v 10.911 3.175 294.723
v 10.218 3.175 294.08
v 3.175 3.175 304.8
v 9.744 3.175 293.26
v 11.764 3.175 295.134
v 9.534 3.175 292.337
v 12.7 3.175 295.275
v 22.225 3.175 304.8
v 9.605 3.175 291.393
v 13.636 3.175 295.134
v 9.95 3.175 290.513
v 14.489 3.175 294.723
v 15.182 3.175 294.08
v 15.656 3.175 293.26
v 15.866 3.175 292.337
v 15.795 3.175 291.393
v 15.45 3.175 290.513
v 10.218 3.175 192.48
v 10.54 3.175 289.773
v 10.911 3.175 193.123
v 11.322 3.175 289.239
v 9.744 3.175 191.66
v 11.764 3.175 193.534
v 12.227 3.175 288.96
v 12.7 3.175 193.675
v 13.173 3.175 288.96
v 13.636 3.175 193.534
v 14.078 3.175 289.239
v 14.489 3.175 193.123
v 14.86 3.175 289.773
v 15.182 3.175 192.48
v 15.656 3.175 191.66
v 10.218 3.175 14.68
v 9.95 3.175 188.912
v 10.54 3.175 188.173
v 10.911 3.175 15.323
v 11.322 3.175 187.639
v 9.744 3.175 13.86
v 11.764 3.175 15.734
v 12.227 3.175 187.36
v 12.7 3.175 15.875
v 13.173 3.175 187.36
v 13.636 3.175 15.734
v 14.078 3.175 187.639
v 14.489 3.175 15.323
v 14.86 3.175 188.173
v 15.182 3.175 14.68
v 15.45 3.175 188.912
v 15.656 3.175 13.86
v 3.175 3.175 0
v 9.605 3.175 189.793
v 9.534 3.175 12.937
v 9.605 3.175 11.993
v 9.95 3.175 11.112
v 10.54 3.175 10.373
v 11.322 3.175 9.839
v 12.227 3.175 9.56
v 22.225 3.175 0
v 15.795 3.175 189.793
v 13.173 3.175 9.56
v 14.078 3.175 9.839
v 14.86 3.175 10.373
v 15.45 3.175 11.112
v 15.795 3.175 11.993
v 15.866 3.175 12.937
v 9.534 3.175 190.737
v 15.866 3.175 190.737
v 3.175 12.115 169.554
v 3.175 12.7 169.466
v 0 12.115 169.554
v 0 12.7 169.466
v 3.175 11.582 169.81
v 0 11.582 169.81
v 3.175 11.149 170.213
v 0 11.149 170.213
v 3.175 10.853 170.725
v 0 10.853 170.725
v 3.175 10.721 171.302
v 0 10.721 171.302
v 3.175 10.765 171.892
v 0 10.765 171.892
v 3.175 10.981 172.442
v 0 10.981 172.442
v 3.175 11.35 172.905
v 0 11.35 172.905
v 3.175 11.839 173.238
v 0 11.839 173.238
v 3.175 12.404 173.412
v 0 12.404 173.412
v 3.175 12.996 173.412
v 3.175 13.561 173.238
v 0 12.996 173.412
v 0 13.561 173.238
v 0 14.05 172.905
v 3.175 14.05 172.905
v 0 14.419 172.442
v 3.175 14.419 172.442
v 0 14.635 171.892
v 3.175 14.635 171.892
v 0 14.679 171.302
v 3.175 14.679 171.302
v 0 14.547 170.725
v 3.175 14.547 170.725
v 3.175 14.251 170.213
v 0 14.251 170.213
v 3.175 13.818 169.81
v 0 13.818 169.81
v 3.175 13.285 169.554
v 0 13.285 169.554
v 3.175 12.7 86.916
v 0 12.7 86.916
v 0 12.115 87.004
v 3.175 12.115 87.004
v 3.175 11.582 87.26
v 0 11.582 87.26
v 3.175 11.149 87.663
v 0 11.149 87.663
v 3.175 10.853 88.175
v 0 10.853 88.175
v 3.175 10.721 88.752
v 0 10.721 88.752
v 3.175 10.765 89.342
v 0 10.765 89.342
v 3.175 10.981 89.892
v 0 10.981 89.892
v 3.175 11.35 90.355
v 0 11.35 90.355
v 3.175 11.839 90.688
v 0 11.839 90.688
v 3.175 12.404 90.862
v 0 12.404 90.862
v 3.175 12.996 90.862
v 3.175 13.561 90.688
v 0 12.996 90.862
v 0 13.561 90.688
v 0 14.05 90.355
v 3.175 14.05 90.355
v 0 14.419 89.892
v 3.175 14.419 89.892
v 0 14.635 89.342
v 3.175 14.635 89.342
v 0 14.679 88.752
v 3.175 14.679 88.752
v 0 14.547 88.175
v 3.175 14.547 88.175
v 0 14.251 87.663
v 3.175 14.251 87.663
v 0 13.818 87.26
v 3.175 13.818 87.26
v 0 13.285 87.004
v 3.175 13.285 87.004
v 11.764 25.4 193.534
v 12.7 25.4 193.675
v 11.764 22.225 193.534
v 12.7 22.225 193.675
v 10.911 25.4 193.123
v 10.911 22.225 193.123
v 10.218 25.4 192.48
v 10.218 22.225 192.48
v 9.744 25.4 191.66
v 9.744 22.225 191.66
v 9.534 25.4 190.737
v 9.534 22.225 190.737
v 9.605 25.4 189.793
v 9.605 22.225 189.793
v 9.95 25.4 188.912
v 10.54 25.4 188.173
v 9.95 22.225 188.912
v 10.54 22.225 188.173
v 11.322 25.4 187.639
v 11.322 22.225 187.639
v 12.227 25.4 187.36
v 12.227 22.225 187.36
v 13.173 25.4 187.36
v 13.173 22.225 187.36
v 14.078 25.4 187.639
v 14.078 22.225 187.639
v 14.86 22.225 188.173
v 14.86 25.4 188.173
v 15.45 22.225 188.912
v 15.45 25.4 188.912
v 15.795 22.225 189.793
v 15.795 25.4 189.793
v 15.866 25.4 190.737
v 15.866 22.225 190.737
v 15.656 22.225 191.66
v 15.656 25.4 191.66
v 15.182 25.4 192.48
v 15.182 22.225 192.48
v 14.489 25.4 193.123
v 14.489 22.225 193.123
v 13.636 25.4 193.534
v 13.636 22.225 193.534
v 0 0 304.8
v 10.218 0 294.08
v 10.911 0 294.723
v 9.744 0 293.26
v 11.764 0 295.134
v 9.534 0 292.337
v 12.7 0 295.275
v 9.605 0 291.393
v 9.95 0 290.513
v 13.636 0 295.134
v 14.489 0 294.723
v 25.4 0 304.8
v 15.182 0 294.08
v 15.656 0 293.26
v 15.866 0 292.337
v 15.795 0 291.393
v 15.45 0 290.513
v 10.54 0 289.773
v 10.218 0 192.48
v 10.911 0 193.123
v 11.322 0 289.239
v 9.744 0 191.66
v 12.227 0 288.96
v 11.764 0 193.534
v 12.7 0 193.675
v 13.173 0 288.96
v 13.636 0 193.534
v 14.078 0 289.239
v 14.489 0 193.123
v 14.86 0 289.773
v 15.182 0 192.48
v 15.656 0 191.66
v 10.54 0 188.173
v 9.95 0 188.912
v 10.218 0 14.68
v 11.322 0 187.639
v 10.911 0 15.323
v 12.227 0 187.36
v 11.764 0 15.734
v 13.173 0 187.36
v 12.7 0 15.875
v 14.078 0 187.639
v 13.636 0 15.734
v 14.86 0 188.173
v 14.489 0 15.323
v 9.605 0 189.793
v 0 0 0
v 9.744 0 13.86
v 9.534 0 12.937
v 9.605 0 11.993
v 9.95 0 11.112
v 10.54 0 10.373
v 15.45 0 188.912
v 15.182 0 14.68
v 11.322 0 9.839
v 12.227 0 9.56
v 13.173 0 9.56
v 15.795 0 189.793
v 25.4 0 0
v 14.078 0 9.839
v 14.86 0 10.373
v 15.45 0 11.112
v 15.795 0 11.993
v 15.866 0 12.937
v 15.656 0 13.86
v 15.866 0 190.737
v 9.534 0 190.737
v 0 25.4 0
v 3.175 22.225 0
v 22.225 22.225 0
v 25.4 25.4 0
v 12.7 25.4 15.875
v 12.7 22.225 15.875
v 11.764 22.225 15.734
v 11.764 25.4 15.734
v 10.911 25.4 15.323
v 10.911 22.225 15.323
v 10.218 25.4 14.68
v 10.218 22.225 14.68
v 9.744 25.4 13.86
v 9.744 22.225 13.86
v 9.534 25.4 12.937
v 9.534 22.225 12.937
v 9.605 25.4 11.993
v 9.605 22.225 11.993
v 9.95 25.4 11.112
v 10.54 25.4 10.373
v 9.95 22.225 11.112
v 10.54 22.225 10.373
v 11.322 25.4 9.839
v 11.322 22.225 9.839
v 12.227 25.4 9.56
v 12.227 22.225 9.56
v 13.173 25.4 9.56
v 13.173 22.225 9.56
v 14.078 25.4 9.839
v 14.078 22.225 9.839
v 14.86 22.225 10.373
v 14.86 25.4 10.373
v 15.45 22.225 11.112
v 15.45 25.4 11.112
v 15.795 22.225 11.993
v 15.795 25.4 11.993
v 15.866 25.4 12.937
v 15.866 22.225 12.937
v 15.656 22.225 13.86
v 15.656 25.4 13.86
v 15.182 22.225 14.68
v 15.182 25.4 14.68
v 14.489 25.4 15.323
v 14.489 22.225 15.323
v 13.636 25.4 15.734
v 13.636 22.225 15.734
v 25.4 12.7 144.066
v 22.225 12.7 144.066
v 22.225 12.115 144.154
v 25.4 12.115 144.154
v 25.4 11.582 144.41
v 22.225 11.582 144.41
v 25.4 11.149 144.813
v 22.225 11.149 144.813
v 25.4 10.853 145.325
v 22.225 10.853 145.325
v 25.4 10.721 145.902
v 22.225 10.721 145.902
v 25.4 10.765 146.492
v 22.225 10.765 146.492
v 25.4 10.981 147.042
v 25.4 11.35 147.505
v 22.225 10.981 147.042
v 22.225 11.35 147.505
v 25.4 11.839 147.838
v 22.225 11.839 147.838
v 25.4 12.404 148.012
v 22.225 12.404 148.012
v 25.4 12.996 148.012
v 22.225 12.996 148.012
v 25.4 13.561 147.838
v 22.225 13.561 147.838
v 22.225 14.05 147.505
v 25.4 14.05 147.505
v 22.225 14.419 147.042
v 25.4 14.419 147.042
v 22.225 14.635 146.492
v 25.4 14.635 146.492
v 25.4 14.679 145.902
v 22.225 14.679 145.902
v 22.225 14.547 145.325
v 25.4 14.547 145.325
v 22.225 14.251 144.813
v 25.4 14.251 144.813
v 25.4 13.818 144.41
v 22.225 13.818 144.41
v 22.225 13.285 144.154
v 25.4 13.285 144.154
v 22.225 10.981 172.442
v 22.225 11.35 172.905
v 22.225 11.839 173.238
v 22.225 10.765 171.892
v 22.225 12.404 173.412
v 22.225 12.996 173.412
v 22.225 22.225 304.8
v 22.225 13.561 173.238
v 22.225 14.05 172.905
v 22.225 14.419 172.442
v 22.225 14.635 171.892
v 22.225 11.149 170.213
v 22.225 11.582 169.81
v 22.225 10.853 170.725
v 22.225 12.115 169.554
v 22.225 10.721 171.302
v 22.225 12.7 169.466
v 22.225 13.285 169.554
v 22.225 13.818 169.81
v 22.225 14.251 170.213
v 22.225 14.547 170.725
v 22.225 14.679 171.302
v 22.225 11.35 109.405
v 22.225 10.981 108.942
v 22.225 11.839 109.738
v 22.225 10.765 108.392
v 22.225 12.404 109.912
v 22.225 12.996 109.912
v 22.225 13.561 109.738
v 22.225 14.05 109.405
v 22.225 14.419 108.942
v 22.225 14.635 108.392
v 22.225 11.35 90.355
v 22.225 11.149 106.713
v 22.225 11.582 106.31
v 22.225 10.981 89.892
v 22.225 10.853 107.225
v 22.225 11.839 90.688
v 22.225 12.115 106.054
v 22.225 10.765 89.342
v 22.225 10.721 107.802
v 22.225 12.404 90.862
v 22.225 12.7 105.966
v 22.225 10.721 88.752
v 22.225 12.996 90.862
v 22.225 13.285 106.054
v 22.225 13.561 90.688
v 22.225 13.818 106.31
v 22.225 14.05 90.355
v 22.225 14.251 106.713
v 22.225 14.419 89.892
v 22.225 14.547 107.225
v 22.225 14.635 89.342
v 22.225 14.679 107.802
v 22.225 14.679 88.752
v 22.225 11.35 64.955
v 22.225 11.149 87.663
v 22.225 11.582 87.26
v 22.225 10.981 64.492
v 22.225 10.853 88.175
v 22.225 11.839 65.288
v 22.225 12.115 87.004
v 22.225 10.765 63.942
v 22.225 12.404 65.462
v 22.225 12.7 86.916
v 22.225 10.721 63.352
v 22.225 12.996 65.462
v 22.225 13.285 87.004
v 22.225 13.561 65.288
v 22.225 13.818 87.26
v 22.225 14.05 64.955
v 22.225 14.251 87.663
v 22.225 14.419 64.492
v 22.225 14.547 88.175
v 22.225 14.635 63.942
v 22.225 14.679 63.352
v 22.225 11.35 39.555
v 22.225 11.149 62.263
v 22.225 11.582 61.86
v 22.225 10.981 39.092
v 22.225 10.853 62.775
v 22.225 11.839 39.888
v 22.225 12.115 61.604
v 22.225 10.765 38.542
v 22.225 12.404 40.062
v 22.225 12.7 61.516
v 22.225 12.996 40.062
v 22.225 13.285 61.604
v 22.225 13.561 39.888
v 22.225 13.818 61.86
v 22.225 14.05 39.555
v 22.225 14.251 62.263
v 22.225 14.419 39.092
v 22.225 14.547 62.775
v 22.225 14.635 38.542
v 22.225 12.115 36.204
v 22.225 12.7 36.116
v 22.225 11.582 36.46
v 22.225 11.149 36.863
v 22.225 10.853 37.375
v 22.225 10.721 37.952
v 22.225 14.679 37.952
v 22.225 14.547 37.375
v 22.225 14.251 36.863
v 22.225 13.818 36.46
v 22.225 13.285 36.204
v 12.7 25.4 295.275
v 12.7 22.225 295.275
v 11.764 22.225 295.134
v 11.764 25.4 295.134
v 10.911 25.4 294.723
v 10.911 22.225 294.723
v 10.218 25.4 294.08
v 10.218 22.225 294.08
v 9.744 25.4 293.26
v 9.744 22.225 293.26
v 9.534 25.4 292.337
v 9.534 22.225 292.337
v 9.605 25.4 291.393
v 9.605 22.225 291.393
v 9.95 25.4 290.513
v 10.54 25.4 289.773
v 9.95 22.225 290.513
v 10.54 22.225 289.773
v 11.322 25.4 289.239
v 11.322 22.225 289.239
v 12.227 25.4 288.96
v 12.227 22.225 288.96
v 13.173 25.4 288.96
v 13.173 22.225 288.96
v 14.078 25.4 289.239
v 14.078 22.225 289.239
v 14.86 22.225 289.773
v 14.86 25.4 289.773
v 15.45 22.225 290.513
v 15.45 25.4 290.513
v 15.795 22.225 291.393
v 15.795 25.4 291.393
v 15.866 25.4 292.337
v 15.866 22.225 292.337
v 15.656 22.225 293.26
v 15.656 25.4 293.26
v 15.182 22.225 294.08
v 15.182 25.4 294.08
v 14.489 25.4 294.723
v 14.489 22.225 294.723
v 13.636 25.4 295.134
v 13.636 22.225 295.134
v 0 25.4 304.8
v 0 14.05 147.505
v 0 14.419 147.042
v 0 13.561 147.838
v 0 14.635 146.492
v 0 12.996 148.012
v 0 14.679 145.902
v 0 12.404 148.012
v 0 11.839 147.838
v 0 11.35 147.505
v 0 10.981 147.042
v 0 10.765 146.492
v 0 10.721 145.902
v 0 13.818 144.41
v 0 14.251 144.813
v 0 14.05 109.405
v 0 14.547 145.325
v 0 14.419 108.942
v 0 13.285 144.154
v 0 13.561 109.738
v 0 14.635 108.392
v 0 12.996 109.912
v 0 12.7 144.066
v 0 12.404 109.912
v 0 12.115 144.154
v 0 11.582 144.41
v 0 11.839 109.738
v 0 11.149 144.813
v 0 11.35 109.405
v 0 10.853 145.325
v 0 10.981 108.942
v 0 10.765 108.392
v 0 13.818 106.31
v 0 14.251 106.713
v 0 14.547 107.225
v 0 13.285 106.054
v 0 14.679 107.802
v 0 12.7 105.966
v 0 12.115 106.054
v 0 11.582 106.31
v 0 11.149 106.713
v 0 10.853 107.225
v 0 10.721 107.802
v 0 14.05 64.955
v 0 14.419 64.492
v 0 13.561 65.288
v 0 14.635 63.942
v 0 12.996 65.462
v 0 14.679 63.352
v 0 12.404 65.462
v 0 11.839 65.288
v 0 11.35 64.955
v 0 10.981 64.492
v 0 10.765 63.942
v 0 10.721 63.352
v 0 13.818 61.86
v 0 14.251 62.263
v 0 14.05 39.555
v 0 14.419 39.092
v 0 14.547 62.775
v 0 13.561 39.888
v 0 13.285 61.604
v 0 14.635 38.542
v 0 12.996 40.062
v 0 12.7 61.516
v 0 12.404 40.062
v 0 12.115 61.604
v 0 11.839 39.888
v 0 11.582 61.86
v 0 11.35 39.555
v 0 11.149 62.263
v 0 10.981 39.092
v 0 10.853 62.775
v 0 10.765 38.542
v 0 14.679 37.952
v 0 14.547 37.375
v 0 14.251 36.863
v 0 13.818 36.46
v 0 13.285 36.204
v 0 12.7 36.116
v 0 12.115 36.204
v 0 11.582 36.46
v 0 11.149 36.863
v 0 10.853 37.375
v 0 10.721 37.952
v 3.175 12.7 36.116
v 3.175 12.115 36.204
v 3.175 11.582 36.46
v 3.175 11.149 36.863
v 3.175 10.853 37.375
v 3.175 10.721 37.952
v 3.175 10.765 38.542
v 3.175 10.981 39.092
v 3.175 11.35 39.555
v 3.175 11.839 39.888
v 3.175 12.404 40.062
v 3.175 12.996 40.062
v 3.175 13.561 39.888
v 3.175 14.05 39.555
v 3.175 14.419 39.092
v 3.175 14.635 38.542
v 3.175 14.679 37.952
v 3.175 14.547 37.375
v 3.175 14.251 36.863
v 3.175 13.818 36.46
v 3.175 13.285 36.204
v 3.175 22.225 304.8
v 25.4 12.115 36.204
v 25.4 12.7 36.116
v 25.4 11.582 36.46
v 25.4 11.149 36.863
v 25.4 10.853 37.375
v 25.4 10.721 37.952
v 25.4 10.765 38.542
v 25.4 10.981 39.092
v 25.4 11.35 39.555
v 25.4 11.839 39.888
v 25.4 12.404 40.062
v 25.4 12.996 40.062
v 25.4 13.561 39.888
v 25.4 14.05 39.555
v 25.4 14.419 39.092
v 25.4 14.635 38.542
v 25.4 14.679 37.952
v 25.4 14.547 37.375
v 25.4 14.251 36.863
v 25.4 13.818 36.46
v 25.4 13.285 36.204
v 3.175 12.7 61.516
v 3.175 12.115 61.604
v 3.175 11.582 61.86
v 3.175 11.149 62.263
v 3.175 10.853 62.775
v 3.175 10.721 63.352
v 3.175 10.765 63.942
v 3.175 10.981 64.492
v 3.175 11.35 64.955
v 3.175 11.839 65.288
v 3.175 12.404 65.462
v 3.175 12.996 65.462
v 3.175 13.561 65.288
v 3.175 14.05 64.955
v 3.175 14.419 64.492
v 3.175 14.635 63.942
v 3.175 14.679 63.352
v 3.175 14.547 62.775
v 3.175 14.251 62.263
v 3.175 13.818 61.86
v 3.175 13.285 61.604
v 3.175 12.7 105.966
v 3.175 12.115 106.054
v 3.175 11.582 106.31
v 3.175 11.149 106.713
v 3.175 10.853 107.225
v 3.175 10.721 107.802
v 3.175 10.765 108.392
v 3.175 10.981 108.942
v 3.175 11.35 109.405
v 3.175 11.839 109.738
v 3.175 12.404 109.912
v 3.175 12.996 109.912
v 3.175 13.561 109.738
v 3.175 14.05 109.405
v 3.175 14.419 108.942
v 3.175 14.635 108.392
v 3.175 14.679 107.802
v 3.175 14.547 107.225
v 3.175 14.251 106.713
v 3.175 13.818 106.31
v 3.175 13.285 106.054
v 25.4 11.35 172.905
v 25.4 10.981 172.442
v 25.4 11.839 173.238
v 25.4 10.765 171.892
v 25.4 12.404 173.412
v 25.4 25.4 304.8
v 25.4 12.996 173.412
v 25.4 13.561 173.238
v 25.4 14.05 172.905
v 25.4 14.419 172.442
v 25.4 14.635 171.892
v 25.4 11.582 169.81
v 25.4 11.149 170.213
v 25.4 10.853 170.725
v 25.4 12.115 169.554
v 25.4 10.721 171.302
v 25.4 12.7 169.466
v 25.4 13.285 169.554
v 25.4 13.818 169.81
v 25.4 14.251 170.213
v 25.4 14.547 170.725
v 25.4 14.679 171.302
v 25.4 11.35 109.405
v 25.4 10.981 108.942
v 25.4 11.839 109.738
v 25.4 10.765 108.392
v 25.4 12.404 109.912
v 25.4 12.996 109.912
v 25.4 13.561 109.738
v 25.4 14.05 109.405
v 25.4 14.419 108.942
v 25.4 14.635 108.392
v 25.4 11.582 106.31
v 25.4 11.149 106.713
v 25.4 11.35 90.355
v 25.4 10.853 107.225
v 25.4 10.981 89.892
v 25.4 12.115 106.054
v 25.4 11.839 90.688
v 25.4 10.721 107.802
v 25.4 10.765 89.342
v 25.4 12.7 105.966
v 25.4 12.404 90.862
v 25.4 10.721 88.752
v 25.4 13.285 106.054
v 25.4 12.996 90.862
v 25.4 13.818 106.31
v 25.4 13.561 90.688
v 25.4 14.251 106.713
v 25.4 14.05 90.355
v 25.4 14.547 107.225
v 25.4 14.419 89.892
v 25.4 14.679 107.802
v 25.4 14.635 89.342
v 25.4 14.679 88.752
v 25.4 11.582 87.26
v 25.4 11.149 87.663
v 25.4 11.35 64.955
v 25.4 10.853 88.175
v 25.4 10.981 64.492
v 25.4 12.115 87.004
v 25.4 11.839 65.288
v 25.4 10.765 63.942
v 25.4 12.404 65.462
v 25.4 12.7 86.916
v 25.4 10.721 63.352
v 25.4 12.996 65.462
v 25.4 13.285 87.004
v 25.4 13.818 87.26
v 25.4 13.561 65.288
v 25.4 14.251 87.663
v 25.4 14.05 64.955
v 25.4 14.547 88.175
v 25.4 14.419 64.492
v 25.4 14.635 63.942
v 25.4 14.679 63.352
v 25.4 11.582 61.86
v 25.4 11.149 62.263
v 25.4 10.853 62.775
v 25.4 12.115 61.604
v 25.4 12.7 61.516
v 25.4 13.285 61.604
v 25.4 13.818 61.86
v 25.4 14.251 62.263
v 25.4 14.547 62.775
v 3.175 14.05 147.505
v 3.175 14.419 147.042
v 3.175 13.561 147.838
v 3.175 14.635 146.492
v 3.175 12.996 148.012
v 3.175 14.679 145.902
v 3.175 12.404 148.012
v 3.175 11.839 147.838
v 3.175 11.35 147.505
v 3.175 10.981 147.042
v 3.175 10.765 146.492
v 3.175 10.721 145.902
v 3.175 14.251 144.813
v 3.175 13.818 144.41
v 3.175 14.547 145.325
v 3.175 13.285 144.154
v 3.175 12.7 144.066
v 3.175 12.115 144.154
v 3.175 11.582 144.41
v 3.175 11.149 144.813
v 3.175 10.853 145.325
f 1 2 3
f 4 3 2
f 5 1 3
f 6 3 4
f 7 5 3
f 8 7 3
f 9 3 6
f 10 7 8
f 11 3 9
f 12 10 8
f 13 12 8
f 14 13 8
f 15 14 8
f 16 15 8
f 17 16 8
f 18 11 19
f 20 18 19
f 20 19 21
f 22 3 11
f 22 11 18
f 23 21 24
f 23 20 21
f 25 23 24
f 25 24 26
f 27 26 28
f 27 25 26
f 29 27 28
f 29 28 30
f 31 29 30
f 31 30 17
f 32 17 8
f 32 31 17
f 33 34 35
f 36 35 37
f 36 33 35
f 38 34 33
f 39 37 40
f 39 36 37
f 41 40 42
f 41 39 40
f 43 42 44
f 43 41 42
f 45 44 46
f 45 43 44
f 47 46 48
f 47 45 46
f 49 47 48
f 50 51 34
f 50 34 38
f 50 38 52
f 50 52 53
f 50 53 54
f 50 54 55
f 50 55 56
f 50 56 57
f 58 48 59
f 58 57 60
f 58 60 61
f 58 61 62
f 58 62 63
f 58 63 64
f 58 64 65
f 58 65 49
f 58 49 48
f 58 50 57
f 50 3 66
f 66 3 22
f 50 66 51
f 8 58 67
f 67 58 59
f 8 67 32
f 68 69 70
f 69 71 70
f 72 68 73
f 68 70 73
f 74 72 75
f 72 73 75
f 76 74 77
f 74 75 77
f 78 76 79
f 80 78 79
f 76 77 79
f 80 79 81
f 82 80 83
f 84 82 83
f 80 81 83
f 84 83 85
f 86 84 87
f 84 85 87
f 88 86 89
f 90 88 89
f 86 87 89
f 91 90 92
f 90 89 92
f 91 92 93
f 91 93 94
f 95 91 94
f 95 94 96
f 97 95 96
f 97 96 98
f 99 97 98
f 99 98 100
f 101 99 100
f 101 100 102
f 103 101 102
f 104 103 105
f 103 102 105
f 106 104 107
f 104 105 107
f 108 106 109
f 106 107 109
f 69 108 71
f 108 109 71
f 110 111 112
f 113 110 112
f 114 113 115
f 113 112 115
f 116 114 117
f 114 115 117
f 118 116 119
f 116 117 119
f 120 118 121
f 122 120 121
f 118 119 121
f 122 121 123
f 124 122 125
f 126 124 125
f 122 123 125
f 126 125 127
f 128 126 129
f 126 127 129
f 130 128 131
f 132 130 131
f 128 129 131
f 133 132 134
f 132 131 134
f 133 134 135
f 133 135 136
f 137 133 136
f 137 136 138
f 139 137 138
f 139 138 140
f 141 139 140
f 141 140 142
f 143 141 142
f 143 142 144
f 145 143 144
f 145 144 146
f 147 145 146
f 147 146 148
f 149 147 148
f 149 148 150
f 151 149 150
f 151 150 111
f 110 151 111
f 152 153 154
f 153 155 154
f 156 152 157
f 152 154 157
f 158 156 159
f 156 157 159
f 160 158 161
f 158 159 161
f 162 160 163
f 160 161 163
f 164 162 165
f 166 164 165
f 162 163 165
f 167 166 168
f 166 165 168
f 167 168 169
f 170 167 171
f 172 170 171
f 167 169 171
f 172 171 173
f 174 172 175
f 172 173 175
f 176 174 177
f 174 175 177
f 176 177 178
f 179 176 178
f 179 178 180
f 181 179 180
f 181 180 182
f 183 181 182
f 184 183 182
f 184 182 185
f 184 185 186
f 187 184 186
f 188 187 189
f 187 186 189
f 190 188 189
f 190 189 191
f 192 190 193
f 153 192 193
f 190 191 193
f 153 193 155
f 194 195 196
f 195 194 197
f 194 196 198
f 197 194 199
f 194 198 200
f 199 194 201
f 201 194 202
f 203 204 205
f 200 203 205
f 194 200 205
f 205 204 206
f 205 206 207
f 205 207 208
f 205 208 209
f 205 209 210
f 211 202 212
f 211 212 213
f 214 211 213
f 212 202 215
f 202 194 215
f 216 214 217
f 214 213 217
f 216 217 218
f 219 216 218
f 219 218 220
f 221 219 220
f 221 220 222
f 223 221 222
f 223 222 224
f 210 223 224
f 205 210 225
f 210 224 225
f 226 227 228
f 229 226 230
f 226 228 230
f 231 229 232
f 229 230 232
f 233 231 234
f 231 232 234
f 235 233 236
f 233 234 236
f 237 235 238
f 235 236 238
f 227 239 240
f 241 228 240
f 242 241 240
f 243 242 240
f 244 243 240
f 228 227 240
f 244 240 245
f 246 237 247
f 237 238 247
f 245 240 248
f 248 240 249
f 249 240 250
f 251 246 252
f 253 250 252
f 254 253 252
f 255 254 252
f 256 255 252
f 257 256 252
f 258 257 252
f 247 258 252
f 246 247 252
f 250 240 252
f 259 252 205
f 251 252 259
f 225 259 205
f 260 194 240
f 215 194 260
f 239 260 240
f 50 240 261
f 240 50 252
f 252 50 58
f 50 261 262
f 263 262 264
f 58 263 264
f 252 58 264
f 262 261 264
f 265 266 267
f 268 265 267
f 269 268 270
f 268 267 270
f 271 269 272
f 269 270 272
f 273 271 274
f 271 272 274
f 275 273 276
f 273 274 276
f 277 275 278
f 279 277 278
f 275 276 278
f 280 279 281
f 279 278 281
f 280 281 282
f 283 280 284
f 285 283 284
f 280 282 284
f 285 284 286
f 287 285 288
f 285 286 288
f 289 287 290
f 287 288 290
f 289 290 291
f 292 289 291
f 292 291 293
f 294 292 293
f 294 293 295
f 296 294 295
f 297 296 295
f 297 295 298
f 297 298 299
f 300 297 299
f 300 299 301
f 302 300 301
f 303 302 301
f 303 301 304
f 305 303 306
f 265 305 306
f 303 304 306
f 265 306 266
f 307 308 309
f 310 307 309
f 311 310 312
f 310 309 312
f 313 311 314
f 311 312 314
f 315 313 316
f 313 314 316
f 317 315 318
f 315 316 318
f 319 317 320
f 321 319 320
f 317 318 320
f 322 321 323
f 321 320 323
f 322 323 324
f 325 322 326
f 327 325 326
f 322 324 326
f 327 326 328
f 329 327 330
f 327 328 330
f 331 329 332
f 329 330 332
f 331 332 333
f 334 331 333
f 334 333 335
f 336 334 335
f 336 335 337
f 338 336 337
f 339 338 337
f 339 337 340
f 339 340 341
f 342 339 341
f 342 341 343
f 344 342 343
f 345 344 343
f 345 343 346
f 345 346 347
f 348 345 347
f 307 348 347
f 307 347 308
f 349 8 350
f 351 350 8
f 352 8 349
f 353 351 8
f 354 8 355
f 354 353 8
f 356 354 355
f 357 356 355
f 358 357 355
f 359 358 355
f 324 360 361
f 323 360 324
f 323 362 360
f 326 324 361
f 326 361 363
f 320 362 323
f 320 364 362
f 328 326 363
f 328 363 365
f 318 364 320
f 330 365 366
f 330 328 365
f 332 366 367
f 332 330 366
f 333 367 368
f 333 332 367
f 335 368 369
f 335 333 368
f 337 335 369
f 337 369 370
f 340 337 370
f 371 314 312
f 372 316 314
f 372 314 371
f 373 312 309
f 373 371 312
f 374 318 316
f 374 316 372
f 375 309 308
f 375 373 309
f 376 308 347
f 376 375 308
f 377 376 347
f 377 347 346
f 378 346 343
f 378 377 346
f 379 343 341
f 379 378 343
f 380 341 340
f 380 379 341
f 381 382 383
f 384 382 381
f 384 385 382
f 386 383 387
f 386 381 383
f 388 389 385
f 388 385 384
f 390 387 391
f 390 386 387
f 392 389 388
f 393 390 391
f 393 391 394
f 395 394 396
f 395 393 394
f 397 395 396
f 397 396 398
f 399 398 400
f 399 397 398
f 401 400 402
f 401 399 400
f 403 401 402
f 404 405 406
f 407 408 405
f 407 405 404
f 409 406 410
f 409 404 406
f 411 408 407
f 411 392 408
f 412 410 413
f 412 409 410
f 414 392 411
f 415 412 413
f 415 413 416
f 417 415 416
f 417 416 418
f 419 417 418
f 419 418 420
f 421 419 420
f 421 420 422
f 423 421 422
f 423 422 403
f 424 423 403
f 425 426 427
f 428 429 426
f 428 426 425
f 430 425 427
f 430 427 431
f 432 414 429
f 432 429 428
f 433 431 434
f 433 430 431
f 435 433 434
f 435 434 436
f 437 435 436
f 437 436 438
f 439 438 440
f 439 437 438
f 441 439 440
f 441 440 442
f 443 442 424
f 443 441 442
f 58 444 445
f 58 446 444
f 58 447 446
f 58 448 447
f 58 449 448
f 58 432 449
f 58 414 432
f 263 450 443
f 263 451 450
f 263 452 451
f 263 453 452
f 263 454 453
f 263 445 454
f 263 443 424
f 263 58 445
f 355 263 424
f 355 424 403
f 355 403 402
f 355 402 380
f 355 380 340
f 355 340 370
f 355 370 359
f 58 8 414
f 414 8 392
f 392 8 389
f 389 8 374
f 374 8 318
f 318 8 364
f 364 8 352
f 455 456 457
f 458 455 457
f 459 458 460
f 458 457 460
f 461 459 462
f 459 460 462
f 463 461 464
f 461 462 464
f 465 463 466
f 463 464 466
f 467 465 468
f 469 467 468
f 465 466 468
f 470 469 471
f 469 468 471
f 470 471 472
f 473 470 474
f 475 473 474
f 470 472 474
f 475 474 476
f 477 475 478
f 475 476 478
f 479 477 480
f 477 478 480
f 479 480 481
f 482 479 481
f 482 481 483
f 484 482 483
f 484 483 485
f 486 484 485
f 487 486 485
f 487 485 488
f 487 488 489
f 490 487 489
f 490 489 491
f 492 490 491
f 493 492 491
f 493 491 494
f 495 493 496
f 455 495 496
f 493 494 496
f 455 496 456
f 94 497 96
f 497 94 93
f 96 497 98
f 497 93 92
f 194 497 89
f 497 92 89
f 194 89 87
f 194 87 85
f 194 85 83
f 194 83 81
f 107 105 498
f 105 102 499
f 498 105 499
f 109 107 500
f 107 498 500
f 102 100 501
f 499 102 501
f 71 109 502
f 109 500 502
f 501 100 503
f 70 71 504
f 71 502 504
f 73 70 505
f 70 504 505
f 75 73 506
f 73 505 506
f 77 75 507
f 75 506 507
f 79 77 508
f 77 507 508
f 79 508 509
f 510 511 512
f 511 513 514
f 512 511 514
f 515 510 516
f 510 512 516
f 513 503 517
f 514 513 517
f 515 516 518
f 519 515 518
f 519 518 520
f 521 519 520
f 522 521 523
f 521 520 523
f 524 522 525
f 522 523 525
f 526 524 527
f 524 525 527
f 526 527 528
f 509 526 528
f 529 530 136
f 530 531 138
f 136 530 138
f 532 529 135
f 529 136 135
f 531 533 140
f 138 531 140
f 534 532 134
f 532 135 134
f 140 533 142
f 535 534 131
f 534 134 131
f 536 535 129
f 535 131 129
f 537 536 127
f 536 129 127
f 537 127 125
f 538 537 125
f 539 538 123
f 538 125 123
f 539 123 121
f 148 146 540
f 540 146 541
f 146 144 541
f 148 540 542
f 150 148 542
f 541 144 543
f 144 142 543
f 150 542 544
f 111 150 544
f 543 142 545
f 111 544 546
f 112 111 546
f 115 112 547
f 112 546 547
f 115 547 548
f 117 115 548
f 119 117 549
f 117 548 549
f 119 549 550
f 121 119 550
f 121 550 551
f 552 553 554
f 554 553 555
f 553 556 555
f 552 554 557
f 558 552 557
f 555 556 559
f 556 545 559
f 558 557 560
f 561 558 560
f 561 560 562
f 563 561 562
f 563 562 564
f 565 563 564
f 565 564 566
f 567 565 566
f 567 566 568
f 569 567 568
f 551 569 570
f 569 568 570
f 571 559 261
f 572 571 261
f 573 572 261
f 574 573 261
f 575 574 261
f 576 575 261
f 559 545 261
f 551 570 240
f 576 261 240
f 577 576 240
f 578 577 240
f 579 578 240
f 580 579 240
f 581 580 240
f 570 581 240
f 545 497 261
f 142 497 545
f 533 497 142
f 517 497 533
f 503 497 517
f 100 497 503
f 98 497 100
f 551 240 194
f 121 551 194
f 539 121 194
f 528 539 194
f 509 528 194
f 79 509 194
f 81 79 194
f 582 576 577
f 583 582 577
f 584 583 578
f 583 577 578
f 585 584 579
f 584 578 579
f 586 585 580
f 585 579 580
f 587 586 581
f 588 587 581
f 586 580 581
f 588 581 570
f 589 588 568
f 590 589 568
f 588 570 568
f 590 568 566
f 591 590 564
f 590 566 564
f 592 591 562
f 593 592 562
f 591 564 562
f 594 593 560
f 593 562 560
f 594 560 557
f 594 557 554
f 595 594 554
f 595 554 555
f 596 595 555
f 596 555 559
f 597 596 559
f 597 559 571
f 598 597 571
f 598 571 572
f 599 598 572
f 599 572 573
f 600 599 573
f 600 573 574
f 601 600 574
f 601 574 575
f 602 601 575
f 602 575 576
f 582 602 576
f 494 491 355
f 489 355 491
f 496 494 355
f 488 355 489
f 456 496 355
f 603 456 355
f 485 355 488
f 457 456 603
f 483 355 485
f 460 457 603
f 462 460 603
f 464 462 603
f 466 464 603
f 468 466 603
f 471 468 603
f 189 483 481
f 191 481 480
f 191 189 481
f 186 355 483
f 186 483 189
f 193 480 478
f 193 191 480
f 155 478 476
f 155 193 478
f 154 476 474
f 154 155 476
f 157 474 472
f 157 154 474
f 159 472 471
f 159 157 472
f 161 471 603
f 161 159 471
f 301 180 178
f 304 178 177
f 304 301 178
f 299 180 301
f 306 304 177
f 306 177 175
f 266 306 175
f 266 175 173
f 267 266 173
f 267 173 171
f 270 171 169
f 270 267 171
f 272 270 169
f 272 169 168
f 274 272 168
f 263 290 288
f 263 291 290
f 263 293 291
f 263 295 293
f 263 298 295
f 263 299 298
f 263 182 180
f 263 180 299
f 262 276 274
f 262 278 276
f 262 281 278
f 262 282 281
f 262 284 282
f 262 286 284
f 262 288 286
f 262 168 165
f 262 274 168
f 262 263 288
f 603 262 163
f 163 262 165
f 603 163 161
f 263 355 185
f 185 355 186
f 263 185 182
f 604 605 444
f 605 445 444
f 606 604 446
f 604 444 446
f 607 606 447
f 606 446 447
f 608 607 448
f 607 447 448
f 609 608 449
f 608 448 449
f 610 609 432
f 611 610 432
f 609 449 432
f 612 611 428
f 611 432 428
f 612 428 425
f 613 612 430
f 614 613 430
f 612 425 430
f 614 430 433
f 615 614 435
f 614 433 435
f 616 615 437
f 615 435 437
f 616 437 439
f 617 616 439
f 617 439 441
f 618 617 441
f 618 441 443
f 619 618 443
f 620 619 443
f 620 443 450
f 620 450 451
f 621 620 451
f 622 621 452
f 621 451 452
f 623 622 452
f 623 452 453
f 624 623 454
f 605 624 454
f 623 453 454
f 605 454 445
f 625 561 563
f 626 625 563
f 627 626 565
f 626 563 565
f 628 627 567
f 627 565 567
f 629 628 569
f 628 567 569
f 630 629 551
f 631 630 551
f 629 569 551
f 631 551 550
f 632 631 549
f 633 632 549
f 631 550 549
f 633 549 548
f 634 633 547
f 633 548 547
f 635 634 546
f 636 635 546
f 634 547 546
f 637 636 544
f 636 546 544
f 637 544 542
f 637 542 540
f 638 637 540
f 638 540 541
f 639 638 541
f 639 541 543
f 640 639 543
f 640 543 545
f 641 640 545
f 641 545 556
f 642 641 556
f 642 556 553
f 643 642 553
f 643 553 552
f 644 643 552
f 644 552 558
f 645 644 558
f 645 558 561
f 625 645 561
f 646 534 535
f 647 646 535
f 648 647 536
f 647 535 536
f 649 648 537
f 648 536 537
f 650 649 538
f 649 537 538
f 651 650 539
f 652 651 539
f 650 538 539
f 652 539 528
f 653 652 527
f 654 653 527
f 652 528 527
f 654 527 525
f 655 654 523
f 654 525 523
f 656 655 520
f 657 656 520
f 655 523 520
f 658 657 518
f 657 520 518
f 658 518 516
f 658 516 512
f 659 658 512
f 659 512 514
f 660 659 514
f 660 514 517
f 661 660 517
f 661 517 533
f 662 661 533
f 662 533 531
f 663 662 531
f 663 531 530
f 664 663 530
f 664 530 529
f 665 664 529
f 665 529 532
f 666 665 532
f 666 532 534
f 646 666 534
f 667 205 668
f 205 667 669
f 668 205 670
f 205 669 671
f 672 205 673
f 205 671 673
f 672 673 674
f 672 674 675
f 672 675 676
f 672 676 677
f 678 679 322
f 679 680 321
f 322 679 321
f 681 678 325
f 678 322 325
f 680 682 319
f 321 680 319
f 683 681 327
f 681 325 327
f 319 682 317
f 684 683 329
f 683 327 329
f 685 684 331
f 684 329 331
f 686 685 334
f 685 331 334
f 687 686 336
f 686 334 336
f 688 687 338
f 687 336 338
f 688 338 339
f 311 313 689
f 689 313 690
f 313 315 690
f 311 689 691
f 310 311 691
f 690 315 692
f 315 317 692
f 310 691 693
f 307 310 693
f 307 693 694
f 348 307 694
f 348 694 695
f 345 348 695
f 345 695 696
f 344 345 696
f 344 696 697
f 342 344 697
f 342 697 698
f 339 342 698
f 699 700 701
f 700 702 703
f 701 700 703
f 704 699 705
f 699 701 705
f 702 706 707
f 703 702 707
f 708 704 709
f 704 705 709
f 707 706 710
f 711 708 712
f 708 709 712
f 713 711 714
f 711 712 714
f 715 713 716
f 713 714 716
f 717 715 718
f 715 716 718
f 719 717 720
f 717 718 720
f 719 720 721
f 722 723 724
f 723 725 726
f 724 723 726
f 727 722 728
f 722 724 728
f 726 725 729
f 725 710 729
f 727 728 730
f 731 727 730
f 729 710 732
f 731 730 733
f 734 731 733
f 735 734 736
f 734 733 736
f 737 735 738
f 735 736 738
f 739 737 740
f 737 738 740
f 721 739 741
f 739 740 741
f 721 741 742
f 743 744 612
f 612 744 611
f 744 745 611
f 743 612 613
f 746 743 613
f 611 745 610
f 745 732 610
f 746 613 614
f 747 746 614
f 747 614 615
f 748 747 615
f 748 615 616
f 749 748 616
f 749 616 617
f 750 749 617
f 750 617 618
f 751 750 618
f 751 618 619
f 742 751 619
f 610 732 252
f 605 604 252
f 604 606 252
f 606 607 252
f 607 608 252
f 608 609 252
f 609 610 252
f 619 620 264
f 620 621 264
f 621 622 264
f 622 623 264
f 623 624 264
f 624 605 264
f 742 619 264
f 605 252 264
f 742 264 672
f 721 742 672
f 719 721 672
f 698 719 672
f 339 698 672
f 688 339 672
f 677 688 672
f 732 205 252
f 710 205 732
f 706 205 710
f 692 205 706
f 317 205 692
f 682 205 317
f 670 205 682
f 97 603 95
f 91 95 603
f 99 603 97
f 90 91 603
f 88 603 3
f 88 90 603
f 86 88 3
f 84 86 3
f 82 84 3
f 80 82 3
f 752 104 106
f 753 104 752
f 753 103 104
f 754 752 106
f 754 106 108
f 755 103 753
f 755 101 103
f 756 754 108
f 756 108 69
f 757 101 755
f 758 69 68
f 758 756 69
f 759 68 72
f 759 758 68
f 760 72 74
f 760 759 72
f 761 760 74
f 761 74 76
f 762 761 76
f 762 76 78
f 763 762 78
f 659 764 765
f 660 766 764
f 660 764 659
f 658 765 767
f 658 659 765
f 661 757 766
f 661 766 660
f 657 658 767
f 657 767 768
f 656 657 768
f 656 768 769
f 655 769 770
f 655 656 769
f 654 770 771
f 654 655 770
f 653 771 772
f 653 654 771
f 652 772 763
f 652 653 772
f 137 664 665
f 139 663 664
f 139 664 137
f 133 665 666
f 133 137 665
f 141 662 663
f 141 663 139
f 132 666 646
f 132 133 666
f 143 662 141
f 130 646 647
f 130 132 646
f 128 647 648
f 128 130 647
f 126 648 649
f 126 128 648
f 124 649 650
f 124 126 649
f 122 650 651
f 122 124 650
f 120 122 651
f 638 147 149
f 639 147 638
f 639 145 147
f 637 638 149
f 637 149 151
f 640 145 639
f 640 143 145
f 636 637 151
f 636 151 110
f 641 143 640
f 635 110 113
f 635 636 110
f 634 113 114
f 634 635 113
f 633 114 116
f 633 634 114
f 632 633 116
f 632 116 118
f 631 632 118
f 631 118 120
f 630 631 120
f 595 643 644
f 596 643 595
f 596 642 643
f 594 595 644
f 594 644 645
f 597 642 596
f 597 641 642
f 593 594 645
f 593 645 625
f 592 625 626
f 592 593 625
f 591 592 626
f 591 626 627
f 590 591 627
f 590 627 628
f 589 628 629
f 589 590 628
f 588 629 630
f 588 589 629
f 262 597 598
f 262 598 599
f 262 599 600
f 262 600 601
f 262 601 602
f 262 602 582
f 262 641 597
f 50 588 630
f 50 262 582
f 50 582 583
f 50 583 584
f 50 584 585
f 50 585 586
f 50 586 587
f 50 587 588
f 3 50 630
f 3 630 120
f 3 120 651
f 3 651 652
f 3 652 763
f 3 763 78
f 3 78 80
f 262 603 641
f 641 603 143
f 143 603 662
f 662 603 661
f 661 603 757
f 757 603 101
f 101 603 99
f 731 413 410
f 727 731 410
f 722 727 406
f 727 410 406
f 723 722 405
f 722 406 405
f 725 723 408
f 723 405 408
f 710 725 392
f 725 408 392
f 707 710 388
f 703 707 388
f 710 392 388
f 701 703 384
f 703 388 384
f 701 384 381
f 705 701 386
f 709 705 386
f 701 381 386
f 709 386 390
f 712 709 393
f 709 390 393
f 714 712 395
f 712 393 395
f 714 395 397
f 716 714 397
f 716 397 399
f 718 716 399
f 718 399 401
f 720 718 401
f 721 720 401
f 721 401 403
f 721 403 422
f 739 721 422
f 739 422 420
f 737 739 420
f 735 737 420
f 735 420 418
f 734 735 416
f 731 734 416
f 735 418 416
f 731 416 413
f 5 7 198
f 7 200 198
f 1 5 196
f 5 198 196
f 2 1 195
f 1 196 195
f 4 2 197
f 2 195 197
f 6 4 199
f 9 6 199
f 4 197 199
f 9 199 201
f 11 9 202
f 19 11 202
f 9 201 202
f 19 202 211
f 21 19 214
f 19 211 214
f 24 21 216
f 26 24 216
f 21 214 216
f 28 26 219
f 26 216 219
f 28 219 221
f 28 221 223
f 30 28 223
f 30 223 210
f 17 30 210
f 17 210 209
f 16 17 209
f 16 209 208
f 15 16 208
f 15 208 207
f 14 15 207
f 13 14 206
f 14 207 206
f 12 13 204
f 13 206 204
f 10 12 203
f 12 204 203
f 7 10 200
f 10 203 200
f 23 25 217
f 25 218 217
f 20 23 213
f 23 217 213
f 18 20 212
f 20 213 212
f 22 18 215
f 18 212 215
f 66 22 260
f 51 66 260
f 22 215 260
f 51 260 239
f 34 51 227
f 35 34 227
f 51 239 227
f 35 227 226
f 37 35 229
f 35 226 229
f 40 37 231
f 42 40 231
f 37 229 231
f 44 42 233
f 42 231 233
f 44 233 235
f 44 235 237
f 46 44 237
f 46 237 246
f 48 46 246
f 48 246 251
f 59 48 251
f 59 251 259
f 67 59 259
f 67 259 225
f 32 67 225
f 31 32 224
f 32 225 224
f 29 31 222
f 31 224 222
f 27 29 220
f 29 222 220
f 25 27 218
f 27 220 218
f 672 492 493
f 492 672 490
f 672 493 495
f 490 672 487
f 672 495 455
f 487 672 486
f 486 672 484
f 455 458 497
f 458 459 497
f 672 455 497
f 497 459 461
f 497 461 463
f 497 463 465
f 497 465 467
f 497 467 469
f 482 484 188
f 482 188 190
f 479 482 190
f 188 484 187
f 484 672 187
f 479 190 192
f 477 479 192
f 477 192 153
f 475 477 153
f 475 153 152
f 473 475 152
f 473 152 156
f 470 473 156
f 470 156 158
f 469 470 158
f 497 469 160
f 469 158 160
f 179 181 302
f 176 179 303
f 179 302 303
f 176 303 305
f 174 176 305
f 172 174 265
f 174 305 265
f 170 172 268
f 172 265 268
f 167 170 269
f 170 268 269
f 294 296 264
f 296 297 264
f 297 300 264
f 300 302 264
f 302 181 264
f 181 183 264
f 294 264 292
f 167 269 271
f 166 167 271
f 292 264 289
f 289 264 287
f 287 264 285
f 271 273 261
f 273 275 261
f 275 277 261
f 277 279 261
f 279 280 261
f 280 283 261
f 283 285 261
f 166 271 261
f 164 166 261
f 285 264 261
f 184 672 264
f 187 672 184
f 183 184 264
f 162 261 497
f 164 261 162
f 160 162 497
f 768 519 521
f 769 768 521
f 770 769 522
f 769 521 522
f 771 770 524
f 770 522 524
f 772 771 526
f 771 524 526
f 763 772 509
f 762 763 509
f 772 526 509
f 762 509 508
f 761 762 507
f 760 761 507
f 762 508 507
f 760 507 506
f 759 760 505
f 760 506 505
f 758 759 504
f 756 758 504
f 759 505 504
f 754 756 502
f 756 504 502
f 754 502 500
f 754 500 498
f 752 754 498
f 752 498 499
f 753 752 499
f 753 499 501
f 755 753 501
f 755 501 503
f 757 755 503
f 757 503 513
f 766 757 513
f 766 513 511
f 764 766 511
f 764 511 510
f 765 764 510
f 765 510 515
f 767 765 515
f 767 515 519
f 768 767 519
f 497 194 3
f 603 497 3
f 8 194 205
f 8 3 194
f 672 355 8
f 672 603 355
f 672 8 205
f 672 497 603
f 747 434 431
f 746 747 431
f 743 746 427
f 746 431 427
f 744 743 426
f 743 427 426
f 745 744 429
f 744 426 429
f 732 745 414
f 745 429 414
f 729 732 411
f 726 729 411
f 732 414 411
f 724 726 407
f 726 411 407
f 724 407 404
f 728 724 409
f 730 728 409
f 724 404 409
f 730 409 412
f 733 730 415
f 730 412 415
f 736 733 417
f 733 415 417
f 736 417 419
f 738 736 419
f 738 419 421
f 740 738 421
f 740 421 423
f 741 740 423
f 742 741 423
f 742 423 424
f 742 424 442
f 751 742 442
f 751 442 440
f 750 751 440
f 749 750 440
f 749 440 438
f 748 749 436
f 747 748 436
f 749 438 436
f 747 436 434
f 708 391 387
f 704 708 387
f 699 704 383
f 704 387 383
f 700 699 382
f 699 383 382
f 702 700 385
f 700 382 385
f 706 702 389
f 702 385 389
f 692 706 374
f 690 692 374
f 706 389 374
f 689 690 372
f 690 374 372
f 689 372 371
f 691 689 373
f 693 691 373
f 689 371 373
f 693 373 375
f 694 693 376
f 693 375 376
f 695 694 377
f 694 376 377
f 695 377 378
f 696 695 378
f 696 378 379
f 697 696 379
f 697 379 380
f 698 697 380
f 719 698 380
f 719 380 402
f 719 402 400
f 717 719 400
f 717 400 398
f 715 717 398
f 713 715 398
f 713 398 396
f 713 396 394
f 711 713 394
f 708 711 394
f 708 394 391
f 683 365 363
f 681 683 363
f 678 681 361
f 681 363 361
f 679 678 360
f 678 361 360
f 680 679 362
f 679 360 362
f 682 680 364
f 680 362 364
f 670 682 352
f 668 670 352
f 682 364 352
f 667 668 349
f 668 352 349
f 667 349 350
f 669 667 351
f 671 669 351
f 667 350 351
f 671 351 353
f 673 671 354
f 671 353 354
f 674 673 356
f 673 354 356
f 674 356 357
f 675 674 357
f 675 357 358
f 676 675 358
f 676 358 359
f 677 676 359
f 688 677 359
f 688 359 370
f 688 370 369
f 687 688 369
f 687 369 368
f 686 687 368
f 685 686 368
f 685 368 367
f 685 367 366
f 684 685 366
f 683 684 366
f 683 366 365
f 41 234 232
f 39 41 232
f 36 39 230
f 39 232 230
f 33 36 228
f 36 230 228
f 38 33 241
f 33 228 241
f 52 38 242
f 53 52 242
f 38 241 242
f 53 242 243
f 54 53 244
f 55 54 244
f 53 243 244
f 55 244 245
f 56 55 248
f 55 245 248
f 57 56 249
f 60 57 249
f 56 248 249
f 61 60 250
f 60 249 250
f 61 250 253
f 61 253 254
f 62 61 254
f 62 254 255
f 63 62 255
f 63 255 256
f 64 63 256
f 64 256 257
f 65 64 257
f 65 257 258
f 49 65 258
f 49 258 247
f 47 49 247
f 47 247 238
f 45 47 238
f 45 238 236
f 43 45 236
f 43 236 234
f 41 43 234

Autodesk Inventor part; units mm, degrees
ref_plane "YZ Plane" through (0, 0, 0) normal (1, 0, 0) x (0, 1, 0)
ref_plane "XZ Plane" through (0, 0, 0) normal (0, 1, 0) x (-1, 0, 0)
ref_plane "XY Plane" through (0, 0, 0) normal (0, 0, 1) x (1, 0, 0)
sketch "Sketch1" plane through (0, 0, 0) normal (0, 0, 1) x (1, 0, 0)
  line L0 (0, 0) -> (25.4, 0)
  line L1 (25.4, 0) -> (25.4, 25.4)
  line L2 (25.4, 25.4) -> (0, 25.4)
  line L3 (0, 25.4) -> (0, 0)
  line L4 (3.175, 3.175) -> (22.225, 3.175)
  line L5 (22.225, 3.175) -> (22.225, 22.225)
  line L6 (22.225, 22.225) -> (3.175, 22.225)
  line L7 (3.175, 22.225) -> (3.175, 3.175)
  dimension "d0" = 25.4
  dimension "d1" = 25.4
  dimension "d2" = 19.05
  dimension "d3" = 19.05
  dimension "d4" = 3.175
  dimension "d5" = 3.175
extrude "Extrusion1" add sketch "Sketch1" along normal blind 304.8
sketch "Sketch2" plane through (0, 25.4, 0) normal (0, 1, 0) x (1, 0, 0)
  line L0 (25.4, 0) -> (0, 0) projected
  line L1 (0, 0) -> (0, -304.8) projected
  line L2 (25.4, -304.8) -> (0, -304.8) projected
  line L3 (25.4, 0) -> (25.4, -304.8) projected
  point P0 (12.7, -292.1)
  point P1 (12.7, -12.7)
  point P2 (12.7, -190.5)
  dimension "d8" = 12.7
  dimension "d9" = 12.7
  dimension "d10" = 12.7
  dimension "d11" = 12.7
  dimension "d32" = 12.7
  dimension "d33" = 114.3
sketch "Sketch3" plane through (25.4, 0, 0) normal (1, 0, 0) x (0, 0, -1)
  line L0 (0, 0) -> (-304.8, 0) projected
  line L1 (0, 0) -> (0, 25.4) projected
  point P0 (-38.1, 12.7)
  point P1 (-63.5, 12.7)
  point P2 (-88.9, 12.7)
  dimension "d19" = 12.7
  dimension "d20" = 12.7
  dimension "d21" = 12.7
  dimension "d22" = 38.1
  dimension "d23" = 88.9
  dimension "d24" = 63.5
hole "Hole2" at (25.4, 12.7, 38.1) at (25.4, 12.7, 63.5) at (25.4, 12.7, 88.9) direction (-1, 0, 0) diameter 3.9688 end through all
hole "Hole3" at (12.7, 25.4, 292.1) at (12.7, 25.4, 12.7) at (12.7, 25.4, 190.5) direction (0, -1, 0) diameter 6.35 end through all
sketch "Sketch4" plane through (25.4, 0, 0) normal (1, 0, 0) x (0, 0, -1)
  circle A0 centre (-63.5, 12.7) radius 1.9844 projected
  circle A1 centre (-38.1, 12.7) radius 1.9844 projected
  circle A2 centre (-88.9, 12.7) radius 1.9844 projected
  line L0 (0, 0) -> (0, 25.4) projected
  line L1 (0, 25.4) -> (-304.8, 25.4) projected
  line L2 (-304.8, 0) -> (-304.8, 25.4) projected
  line L3 (0, 0) -> (-304.8, 0) projected
  point P0 (-171.45, 12.7)
  point P1 (-107.95, 12.7)
  point P2 (-146.05, 12.7)
  dimension "d41" = 133.35
  dimension "d42" = 196.85
  dimension "d43" = 158.75
  dimension "d44" = 12.7
  dimension "d45" = 12.7
  dimension "d46" = 12.7
hole "Hole4" at (25.4, 12.7, 171.45) at (25.4, 12.7, 107.95) at (25.4, 12.7, 146.05) direction (-1, 0, 0) diameter 3.9688 end through all
properties part number "mounting block"
